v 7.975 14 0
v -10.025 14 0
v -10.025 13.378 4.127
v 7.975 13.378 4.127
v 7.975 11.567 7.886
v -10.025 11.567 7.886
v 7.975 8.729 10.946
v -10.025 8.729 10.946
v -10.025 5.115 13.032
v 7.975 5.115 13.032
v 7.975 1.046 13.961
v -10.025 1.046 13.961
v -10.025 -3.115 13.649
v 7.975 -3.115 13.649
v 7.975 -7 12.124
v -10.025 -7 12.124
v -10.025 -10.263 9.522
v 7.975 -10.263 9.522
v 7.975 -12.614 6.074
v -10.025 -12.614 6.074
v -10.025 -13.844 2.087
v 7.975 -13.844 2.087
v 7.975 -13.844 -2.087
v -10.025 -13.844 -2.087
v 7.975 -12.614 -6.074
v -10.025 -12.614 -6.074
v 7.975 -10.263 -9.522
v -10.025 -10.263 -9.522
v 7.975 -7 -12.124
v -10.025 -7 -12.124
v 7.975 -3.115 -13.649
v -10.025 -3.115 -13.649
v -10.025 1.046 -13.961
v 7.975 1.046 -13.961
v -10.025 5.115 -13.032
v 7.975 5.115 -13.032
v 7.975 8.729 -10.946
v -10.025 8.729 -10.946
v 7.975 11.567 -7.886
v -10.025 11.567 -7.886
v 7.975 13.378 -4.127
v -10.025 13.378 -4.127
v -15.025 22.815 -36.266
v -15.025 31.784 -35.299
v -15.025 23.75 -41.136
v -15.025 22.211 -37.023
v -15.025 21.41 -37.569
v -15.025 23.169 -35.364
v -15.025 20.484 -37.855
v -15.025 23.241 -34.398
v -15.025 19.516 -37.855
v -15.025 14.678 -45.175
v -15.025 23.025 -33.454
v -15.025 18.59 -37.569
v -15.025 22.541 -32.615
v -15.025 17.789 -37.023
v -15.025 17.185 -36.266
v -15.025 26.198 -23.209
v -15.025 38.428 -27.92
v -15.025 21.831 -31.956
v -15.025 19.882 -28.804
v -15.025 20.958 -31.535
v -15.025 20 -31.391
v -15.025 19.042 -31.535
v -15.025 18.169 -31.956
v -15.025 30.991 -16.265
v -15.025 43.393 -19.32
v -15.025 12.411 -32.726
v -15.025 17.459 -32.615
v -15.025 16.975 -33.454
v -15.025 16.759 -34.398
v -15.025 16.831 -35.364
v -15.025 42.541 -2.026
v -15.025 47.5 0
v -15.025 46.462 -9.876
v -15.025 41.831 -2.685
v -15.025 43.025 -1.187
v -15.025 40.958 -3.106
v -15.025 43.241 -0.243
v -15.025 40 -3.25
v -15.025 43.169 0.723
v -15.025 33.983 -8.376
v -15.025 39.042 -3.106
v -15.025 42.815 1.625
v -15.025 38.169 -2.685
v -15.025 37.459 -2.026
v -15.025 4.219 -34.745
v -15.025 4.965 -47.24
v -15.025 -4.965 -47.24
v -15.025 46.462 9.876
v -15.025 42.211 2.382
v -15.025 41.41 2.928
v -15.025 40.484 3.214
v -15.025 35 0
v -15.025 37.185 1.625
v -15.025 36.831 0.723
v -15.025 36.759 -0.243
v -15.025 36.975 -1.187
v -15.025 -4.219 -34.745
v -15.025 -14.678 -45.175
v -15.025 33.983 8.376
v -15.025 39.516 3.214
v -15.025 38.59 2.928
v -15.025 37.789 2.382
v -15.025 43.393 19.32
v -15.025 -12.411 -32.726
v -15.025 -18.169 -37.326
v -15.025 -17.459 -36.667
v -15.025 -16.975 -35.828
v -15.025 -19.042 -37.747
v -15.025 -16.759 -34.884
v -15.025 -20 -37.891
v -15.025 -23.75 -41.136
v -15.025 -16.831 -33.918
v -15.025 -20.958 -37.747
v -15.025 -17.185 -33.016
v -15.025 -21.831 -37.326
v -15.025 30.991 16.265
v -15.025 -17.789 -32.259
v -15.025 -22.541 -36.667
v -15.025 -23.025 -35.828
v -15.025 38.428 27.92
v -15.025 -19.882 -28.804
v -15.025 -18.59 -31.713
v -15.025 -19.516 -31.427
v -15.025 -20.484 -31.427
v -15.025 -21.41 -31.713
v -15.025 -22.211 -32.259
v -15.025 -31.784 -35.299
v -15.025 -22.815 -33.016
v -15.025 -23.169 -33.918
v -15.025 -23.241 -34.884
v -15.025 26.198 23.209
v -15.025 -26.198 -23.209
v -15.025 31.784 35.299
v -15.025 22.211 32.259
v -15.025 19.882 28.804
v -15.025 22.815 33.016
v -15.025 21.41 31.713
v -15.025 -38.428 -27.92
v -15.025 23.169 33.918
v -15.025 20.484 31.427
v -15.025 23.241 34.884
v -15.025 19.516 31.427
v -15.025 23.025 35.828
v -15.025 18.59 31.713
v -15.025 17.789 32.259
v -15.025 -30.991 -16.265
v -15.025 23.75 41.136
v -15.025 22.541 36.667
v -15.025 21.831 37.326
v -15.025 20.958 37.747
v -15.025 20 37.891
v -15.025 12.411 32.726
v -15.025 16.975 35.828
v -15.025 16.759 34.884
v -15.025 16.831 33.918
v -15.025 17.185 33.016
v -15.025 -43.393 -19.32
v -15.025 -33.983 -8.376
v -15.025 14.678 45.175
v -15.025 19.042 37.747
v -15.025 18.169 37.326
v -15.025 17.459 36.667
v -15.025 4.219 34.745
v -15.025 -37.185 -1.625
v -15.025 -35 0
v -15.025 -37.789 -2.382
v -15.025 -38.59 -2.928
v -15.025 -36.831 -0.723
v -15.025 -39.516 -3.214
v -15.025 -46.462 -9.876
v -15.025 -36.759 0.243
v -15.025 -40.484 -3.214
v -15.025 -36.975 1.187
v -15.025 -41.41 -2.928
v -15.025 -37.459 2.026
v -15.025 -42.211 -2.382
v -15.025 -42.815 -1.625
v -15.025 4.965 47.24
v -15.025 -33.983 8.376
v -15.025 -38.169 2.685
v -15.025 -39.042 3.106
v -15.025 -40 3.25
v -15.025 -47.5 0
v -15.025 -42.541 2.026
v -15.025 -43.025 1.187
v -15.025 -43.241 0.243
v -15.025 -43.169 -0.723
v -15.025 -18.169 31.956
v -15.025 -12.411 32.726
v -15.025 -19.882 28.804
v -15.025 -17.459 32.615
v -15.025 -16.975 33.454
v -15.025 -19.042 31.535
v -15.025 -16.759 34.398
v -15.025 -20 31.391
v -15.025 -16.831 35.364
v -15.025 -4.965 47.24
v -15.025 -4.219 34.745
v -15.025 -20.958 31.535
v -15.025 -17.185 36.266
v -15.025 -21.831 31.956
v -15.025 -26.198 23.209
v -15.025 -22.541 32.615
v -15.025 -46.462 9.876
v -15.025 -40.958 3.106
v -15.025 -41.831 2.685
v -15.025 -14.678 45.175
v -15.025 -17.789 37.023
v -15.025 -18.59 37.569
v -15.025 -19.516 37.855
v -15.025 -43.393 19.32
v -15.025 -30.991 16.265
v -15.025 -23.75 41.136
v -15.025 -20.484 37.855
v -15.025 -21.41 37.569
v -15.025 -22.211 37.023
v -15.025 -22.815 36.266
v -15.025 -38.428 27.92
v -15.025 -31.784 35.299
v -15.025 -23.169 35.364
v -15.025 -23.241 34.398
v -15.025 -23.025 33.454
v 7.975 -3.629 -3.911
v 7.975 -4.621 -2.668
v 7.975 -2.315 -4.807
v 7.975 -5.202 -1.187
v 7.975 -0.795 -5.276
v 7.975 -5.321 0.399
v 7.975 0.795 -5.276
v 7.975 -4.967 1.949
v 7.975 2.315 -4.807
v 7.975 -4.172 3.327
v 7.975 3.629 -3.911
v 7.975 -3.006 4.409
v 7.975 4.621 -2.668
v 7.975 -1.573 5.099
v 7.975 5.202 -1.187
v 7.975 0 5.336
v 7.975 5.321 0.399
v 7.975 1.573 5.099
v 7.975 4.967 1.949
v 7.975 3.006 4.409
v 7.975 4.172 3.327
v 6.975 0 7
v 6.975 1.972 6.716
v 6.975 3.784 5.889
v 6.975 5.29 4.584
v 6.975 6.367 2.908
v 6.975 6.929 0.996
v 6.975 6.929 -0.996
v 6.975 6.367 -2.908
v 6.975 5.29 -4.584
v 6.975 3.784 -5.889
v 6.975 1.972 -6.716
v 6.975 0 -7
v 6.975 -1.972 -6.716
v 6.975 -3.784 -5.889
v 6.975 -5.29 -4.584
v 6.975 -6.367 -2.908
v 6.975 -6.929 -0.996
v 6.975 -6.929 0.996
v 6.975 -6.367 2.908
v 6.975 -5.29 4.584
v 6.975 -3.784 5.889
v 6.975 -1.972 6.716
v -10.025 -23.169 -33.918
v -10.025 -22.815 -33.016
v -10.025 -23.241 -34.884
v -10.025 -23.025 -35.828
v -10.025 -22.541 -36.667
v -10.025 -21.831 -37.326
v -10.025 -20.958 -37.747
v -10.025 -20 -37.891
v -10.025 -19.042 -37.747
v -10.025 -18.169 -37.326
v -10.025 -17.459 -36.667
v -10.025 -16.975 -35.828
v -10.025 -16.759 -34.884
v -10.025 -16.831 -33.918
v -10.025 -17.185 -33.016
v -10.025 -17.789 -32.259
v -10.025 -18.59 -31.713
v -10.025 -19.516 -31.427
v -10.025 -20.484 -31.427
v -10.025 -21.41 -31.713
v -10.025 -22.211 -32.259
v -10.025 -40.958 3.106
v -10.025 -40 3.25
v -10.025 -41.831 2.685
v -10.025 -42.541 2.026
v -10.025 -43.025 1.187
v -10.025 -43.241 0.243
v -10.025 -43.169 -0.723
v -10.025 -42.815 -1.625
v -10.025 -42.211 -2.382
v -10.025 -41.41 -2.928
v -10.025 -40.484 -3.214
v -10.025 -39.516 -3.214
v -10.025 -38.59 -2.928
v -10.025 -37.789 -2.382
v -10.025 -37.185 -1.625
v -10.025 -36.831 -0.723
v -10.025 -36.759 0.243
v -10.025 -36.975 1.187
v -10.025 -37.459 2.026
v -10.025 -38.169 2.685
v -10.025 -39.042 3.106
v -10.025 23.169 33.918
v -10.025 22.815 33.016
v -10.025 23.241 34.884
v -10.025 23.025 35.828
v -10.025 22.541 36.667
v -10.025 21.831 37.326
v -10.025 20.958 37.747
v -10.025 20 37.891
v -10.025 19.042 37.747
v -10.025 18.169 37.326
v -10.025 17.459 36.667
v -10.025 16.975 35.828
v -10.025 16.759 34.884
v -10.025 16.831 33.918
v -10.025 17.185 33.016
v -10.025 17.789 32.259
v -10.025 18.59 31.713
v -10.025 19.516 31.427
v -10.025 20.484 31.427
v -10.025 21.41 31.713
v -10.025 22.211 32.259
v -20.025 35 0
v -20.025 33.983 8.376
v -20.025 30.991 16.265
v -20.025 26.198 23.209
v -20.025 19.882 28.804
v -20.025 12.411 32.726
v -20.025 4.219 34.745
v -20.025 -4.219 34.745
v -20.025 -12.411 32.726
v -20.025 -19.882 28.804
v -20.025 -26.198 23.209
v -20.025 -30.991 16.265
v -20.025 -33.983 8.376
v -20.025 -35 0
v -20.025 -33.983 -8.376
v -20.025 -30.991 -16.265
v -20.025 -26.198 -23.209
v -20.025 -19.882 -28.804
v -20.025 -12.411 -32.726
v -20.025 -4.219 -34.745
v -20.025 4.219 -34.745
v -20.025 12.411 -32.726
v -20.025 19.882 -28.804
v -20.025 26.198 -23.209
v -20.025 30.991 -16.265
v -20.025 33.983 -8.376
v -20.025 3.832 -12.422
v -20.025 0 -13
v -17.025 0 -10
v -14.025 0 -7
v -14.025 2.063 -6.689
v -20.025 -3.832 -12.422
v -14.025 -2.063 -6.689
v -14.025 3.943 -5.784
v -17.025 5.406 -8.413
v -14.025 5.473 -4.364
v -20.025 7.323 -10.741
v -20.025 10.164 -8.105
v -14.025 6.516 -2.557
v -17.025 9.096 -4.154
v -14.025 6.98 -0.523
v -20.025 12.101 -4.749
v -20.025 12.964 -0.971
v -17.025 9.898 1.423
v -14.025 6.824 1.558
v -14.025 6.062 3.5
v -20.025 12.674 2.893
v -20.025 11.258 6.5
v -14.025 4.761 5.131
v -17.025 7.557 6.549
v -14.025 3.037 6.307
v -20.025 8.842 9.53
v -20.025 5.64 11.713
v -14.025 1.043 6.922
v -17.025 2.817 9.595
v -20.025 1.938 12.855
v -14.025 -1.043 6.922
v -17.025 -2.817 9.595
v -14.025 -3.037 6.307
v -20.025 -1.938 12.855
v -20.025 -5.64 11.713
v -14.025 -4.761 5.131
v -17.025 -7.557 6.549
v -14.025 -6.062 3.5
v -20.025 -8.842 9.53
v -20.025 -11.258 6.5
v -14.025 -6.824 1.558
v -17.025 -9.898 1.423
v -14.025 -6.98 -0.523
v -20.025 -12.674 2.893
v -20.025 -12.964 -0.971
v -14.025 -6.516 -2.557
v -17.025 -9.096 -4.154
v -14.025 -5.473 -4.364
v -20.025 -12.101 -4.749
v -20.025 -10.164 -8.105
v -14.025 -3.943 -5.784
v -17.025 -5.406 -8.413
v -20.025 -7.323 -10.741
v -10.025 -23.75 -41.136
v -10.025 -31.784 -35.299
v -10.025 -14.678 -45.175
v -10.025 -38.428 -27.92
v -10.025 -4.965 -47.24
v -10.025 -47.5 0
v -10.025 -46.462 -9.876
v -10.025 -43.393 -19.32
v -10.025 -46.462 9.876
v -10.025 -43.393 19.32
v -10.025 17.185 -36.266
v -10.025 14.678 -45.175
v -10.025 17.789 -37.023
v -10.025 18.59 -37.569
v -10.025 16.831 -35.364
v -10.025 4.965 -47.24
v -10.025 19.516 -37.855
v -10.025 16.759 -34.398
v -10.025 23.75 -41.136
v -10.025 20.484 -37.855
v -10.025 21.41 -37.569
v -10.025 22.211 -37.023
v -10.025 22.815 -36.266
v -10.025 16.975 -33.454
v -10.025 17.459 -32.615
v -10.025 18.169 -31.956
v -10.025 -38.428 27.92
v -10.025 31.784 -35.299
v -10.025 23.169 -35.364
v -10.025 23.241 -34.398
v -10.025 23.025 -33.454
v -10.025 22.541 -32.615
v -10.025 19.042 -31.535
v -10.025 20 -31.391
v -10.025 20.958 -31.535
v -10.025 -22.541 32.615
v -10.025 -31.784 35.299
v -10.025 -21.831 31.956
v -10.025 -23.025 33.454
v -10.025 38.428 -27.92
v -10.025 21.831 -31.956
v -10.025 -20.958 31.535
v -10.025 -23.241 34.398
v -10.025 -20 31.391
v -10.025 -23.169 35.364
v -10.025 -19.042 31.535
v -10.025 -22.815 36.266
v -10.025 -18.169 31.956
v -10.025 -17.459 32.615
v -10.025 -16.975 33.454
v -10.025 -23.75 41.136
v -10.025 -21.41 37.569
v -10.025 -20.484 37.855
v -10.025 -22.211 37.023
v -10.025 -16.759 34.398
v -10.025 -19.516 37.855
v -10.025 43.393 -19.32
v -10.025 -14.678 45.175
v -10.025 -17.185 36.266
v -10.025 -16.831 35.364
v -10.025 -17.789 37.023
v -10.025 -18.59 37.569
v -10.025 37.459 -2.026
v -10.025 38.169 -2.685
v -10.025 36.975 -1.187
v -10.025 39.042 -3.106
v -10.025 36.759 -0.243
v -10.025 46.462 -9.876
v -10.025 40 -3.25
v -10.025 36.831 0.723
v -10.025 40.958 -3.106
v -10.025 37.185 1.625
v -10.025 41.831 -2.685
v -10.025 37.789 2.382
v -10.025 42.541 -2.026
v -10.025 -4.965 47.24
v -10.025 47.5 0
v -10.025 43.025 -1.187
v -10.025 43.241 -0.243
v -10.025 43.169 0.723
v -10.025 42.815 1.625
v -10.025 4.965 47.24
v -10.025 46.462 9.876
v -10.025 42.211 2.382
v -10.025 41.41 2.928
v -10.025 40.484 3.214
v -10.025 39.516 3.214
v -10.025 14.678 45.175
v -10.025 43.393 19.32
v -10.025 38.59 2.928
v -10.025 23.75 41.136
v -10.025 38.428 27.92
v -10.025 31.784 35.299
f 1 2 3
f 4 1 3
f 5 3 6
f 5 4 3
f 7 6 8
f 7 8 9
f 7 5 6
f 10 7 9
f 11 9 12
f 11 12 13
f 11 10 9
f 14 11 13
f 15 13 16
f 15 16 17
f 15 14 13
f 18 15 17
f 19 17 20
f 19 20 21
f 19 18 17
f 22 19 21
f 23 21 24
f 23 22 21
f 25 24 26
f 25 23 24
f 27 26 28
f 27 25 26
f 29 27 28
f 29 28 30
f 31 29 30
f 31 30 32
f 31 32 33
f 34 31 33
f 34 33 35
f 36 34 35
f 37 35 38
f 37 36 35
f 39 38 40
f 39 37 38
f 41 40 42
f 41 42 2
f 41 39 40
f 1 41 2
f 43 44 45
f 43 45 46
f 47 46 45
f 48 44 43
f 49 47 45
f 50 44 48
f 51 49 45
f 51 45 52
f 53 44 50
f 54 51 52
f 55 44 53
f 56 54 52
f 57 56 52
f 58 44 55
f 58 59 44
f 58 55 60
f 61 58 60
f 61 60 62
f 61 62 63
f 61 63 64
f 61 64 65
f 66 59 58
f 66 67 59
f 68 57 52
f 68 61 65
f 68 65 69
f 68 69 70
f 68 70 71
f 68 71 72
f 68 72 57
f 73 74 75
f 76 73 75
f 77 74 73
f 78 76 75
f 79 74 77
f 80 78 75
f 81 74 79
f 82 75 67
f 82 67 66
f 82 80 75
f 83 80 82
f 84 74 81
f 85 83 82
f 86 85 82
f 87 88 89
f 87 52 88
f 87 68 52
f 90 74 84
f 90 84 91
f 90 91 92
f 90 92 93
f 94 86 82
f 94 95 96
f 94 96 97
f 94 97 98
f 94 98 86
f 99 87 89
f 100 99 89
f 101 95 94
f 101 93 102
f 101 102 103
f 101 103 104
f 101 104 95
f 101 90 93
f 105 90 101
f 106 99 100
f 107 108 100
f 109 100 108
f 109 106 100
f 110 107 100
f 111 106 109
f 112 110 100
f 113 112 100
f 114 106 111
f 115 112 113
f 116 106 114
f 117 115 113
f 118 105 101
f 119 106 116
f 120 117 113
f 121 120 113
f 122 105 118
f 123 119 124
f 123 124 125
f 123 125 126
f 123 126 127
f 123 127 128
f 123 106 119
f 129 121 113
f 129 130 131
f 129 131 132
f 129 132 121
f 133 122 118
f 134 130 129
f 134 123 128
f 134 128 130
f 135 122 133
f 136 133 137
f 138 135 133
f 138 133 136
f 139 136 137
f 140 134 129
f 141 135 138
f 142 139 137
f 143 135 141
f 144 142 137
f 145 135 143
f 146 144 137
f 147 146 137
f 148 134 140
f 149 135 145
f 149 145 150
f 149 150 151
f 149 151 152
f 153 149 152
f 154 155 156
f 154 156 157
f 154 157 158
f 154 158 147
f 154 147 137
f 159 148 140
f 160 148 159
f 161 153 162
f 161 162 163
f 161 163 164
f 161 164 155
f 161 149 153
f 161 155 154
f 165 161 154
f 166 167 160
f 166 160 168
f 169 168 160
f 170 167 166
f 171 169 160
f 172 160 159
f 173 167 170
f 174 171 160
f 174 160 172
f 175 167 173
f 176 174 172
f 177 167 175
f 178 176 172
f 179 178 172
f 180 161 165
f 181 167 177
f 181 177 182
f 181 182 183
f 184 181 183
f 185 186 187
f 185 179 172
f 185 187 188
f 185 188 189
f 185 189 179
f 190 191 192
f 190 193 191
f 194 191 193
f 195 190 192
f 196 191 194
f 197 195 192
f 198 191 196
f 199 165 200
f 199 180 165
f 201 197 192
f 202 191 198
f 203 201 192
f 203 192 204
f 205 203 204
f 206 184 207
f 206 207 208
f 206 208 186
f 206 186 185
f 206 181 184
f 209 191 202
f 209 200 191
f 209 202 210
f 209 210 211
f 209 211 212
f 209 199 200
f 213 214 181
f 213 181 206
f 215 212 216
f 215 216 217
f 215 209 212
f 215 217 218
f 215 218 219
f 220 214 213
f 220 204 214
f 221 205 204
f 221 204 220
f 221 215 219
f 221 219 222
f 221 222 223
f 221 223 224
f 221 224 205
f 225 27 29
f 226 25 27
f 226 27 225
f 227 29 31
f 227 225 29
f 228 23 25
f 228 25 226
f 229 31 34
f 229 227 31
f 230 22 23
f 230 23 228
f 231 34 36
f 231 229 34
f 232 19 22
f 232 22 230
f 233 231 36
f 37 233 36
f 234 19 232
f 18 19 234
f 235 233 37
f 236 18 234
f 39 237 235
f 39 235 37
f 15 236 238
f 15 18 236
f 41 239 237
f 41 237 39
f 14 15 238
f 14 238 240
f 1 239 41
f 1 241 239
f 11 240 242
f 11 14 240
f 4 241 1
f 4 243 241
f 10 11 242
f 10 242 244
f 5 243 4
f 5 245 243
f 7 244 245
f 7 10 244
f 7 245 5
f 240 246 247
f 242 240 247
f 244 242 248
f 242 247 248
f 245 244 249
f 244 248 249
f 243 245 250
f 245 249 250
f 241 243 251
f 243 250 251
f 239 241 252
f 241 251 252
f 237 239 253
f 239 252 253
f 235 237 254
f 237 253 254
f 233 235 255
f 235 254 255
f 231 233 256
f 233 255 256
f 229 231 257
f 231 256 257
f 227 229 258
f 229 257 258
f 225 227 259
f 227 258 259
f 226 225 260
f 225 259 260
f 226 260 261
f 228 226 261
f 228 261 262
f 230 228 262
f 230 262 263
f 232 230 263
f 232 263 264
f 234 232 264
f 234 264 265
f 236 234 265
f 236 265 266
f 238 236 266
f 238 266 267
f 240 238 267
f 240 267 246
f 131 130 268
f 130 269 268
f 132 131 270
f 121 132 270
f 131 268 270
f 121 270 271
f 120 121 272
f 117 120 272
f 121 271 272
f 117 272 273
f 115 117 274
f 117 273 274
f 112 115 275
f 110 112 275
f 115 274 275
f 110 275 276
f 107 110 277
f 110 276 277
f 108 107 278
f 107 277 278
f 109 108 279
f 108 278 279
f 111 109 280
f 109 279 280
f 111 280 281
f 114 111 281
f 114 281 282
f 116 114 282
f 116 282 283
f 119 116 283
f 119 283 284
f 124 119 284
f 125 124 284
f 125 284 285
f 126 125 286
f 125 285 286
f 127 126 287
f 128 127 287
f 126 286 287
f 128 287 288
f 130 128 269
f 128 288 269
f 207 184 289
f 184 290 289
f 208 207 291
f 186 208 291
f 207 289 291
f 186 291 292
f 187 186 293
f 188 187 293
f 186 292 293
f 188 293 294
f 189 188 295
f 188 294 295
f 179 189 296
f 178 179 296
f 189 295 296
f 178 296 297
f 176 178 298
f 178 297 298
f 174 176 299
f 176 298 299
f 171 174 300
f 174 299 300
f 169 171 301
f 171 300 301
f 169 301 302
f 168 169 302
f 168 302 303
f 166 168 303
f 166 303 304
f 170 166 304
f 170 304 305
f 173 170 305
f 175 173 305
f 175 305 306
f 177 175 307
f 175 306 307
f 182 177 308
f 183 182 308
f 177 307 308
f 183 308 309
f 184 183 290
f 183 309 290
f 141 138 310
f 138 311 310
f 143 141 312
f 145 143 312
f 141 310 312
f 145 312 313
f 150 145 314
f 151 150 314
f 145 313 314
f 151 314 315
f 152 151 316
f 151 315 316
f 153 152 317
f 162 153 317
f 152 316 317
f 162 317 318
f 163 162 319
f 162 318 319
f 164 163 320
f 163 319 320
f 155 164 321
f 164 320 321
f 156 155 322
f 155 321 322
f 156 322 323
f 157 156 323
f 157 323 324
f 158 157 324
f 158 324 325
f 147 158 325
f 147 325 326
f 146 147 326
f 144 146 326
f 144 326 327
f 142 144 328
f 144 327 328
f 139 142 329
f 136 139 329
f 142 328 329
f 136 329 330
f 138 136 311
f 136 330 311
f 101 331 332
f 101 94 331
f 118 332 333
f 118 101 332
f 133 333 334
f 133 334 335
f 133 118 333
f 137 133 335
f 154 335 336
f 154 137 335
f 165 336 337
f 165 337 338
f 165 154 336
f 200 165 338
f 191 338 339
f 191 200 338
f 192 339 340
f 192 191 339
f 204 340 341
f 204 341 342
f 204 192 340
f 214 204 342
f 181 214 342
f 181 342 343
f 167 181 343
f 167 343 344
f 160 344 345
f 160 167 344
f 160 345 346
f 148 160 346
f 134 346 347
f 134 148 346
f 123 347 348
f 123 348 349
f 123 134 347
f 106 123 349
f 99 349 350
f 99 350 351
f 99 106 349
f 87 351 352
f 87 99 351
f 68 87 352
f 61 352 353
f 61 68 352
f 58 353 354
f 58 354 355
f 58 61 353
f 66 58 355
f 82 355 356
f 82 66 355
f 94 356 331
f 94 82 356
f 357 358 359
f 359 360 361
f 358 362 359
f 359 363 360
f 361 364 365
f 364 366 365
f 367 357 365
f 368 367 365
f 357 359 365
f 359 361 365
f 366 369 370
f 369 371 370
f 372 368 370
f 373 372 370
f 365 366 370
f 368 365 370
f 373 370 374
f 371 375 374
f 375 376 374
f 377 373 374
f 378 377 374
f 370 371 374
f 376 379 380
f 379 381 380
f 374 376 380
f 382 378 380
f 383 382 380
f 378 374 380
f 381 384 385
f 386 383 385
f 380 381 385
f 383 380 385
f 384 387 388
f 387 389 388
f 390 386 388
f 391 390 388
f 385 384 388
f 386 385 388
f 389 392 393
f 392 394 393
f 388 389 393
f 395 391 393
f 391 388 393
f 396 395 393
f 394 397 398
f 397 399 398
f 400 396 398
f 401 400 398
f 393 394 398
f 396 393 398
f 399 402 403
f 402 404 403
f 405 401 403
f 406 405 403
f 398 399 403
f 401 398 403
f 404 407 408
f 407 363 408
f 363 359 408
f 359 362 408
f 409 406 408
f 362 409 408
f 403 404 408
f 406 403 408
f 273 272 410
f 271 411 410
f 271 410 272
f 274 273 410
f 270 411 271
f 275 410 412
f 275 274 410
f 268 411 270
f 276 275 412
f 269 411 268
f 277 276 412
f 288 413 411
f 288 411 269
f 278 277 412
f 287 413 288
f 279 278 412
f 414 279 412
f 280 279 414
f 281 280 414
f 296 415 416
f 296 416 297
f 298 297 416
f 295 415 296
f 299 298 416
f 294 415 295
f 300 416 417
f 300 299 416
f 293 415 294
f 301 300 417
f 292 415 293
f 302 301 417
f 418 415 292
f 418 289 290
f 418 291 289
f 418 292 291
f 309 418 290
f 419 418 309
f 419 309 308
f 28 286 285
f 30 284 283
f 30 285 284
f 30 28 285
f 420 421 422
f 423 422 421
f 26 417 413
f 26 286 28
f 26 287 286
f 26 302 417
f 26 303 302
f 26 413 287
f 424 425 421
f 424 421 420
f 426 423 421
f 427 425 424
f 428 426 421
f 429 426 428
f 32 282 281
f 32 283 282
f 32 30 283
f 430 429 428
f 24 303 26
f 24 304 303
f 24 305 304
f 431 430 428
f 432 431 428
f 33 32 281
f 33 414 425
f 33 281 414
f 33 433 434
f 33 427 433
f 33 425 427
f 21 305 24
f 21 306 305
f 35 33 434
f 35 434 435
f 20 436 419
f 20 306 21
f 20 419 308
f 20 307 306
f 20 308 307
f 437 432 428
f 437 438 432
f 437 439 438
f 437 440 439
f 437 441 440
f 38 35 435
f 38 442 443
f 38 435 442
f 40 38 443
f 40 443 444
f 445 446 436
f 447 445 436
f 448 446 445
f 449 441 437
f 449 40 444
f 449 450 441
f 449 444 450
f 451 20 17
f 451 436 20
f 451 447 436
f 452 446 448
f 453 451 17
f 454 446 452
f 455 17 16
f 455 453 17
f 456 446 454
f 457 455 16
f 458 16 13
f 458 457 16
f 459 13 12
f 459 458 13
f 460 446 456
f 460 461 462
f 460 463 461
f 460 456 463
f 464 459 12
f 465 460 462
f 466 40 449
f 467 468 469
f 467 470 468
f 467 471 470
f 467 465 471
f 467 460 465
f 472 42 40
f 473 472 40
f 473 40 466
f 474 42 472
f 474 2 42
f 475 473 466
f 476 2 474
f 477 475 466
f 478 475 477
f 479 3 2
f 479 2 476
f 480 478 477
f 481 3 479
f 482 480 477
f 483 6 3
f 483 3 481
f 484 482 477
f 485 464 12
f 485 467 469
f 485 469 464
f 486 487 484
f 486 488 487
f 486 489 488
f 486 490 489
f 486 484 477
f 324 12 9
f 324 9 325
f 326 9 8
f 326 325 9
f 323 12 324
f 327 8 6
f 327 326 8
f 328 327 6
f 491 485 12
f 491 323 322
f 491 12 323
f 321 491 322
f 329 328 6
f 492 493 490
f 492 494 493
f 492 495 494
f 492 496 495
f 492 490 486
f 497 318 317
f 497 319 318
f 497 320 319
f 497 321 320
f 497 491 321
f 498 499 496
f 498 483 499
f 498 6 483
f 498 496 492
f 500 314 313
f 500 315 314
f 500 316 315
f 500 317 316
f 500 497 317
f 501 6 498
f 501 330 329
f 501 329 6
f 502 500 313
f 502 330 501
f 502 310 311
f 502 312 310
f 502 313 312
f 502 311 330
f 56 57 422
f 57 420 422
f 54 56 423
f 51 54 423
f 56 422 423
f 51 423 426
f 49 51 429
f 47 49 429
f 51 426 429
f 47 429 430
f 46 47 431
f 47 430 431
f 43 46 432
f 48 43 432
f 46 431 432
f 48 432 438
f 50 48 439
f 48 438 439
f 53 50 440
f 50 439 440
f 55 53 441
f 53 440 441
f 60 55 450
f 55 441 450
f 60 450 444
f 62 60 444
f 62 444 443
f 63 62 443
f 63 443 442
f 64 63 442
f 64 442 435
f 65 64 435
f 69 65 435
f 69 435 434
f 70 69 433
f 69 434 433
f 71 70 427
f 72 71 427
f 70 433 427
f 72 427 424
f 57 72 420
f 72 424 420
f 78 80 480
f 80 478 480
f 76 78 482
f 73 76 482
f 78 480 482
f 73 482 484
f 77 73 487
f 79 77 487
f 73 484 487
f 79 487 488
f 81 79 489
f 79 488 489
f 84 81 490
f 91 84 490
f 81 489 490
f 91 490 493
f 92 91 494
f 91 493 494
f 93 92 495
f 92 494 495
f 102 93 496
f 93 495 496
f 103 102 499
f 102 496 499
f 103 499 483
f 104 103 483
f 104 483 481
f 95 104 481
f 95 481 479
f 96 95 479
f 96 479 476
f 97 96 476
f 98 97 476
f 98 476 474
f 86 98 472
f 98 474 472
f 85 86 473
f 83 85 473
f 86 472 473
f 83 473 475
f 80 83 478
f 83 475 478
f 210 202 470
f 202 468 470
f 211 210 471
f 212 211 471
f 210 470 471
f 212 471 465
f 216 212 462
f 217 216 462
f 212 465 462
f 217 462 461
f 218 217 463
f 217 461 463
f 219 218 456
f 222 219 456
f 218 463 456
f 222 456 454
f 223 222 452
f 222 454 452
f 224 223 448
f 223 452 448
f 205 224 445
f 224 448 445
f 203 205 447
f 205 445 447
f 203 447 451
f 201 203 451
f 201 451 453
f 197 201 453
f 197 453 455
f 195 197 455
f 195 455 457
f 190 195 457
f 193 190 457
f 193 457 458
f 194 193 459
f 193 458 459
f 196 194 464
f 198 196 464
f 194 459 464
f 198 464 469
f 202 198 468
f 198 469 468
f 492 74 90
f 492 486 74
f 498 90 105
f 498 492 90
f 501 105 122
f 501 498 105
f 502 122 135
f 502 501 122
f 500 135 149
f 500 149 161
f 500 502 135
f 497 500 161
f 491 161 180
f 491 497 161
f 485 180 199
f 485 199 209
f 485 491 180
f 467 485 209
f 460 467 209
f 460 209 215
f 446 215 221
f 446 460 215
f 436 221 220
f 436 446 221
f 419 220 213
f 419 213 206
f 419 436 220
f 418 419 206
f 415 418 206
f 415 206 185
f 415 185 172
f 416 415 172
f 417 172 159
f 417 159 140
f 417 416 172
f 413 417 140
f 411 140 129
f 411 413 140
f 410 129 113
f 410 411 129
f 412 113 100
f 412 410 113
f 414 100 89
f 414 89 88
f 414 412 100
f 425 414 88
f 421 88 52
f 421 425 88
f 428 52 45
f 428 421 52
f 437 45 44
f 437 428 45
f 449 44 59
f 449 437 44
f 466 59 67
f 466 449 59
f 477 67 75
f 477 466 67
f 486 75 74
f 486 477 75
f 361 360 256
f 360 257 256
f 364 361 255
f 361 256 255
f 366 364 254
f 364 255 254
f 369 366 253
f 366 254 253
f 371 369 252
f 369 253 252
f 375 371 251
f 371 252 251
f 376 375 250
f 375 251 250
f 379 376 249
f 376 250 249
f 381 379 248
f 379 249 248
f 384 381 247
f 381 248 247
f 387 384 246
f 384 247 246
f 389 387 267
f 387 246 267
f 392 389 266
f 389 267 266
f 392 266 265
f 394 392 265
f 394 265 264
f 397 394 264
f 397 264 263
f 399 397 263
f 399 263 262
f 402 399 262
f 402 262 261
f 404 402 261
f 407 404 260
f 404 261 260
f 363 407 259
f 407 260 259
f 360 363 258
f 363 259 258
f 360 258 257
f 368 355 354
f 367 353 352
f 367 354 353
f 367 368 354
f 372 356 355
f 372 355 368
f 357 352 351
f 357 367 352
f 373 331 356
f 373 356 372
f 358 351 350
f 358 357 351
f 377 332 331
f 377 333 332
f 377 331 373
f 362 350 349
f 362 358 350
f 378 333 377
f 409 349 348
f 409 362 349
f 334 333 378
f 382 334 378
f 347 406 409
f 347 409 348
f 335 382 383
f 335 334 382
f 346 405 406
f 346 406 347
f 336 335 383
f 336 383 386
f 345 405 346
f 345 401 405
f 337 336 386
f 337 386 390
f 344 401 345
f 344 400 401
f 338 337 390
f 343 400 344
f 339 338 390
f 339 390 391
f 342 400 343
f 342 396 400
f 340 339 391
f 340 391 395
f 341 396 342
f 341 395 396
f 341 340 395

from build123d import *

# Parameters (mm, degrees)
CSK_FOR_M12_HEX_SOCKET_COUNTERSUNK_CAP_S_D           = 14
CSK_FOR_M12_HEX_SOCKET_COUNTERSUNK_CAP_S_DEPTH       = 27
CSK_FOR_M12_HEX_SOCKET_COUNTERSUNK_CAP_S_CSINK_D     = 26
CSK_FOR_M12_HEX_SOCKET_COUNTERSUNK_CAP_S_CSINK_ANGLE = 90
CSK_FOR_M12_HEX_SOCKET_COUNTERSUNK_CAP_S_TIP         = 4.206024333
CSK_FOR_M6_HEX_SOCKET_COUNTERSUNK_CAP_SC_D           = 6.5
CSK_FOR_M6_HEX_SOCKET_COUNTERSUNK_CAP_SC_CSINK_D     = 7.5
CSK_FOR_M6_HEX_SOCKET_COUNTERSUNK_CAP_SC_CSINK_ANGLE = 90
CIRPATTERN1_COUNT                                    = 6


with BuildPart() as part:
    # Sketch1 → Revolve1 (revolve)
    with BuildSketch(Plane.XY):
        Polygon((-20.025316456, 0), (-20.025316456, 35), (-15.025316456, 35), (-15.025316456, 47.5), (-10.025316456, 47.5), (-10.025316456, 14), (7.974683544, 14), (7.974683544, 0), align=None)
    revolve(axis=Axis((-20.025316456, 0, 0), (1, 0, 0)))

    # CSK for M12 Hex Socket Countersunk Cap Screw1
    with Locations(Plane.ZY.offset(20.025316456)):
        with Locations((0, 0)):
            CounterSinkHole(CSK_FOR_M12_HEX_SOCKET_COUNTERSUNK_CAP_S_D / 2, CSK_FOR_M12_HEX_SOCKET_COUNTERSUNK_CAP_S_CSINK_D / 2, depth=CSK_FOR_M12_HEX_SOCKET_COUNTERSUNK_CAP_S_DEPTH, counter_sink_angle=CSK_FOR_M12_HEX_SOCKET_COUNTERSUNK_CAP_S_CSINK_ANGLE)
            with Locations((0, 0, -(CSK_FOR_M12_HEX_SOCKET_COUNTERSUNK_CAP_S_DEPTH + CSK_FOR_M12_HEX_SOCKET_COUNTERSUNK_CAP_S_TIP / 2))):  # 118° drill point
                Cone(0, CSK_FOR_M12_HEX_SOCKET_COUNTERSUNK_CAP_S_D / 2, CSK_FOR_M12_HEX_SOCKET_COUNTERSUNK_CAP_S_TIP, mode=Mode.SUBTRACT)

    # CSK for M6 Hex Socket Countersunk Cap Screw1 (through all)
    with Locations(Plane.ZY.offset(20.025316456)):
        with Locations((0, 40)):
            csk_for_m6_hex_socket_countersunk_cap_sc = CounterSinkHole(CSK_FOR_M6_HEX_SOCKET_COUNTERSUNK_CAP_SC_D / 2, CSK_FOR_M6_HEX_SOCKET_COUNTERSUNK_CAP_SC_CSINK_D / 2, counter_sink_angle=CSK_FOR_M6_HEX_SOCKET_COUNTERSUNK_CAP_SC_CSINK_ANGLE)

    # CirPattern1: CSK for M6 Hex Socket Countersunk Cap Screw1 ×6 about axis
    cirpattern1_axis = Axis((0, 0, 0), (1, 0, 0))
    for i in range(1, CIRPATTERN1_COUNT):
        add(csk_for_m6_hex_socket_countersunk_cap_sc.rotate(cirpattern1_axis, i * 360 / CIRPATTERN1_COUNT), mode=Mode.SUBTRACT)


solid = part.part
